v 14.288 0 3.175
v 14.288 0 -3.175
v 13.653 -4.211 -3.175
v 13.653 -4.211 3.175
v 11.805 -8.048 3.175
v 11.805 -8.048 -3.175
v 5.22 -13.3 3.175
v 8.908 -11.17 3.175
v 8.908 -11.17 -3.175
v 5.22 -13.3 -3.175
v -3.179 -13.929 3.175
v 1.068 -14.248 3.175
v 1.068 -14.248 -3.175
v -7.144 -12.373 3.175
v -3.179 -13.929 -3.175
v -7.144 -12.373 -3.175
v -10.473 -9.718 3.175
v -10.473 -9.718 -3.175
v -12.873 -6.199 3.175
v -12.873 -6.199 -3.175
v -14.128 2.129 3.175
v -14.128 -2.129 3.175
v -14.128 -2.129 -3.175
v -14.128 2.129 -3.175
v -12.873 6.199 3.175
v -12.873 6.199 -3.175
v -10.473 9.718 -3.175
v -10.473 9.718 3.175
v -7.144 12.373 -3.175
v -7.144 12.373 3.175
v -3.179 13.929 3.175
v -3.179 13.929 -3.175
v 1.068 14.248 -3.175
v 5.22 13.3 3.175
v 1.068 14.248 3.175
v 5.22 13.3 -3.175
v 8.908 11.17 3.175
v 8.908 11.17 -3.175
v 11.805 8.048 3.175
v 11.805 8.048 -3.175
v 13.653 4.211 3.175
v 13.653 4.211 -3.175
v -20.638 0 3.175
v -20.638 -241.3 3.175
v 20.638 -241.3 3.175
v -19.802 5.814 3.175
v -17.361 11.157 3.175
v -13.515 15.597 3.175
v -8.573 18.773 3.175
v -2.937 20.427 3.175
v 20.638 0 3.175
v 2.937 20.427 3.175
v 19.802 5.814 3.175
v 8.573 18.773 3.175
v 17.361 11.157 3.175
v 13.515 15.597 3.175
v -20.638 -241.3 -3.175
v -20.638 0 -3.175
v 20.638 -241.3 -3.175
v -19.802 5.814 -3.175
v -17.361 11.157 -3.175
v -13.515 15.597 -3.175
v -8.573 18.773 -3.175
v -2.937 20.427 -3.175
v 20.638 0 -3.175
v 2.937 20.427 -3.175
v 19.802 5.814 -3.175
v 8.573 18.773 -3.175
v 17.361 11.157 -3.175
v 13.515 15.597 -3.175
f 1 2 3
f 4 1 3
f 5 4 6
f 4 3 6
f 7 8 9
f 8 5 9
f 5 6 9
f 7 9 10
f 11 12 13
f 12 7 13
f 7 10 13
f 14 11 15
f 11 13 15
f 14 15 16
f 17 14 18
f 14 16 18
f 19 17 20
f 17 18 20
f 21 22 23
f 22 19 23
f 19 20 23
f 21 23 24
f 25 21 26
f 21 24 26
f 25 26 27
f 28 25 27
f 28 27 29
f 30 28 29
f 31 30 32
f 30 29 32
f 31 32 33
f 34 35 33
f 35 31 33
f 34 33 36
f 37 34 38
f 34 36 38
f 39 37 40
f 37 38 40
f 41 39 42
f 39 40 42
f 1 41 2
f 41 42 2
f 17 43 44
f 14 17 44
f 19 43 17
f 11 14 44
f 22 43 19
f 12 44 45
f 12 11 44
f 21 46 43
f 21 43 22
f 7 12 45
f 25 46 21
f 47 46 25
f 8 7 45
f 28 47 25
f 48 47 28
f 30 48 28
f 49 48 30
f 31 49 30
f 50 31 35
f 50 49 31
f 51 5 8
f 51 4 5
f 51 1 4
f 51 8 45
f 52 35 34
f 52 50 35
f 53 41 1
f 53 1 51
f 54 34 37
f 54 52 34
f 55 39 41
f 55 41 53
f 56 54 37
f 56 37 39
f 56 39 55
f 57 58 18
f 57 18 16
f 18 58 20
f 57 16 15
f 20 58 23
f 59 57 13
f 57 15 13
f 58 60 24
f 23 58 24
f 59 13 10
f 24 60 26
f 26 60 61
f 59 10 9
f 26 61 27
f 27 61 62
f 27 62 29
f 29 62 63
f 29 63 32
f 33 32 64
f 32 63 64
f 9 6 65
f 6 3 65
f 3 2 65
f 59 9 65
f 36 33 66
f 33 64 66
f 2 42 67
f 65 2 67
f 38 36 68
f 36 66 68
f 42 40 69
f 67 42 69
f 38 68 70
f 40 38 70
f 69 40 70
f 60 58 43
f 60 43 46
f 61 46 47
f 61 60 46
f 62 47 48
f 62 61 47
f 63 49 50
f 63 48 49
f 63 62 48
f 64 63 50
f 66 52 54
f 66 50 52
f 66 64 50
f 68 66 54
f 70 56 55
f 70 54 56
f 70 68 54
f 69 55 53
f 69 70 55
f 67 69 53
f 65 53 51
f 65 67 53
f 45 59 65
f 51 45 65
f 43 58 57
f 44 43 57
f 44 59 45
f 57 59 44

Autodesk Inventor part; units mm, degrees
ref_plane "YZ Plane" through (0, 0, 0) normal (1, 0, 0) x (0, 1, 0)
ref_plane "XZ Plane" through (0, 0, 0) normal (0, 1, 0) x (-1, 0, 0)
ref_plane "XY Plane" through (0, 0, 0) normal (0, 0, 1) x (1, 0, 0)
sketch "Sketch1" plane through (0, 0, 0) normal (0, 0, 1) x (1, 0, 0)
  circle A0 centre (0, 0) radius 14.2875
  circle A1 centre (0, 0) radius 20.6375
  line L0 (20.6375, -241.3) -> (-20.6375, -241.3)
  line L1 (-20.6375, 0) -> (-20.6375, -241.3)
  line L2 (20.6375, -241.3) -> (20.6375, 0)
  dimension "d0" = 28.575
  dimension "d1" = 6.35
  dimension "d2" = 241.3
extrude "Extrusion1" add sketch "Sketch1" along normal mid plane 6.35
properties part number "CL2-001" material "Aluminum 6061"
